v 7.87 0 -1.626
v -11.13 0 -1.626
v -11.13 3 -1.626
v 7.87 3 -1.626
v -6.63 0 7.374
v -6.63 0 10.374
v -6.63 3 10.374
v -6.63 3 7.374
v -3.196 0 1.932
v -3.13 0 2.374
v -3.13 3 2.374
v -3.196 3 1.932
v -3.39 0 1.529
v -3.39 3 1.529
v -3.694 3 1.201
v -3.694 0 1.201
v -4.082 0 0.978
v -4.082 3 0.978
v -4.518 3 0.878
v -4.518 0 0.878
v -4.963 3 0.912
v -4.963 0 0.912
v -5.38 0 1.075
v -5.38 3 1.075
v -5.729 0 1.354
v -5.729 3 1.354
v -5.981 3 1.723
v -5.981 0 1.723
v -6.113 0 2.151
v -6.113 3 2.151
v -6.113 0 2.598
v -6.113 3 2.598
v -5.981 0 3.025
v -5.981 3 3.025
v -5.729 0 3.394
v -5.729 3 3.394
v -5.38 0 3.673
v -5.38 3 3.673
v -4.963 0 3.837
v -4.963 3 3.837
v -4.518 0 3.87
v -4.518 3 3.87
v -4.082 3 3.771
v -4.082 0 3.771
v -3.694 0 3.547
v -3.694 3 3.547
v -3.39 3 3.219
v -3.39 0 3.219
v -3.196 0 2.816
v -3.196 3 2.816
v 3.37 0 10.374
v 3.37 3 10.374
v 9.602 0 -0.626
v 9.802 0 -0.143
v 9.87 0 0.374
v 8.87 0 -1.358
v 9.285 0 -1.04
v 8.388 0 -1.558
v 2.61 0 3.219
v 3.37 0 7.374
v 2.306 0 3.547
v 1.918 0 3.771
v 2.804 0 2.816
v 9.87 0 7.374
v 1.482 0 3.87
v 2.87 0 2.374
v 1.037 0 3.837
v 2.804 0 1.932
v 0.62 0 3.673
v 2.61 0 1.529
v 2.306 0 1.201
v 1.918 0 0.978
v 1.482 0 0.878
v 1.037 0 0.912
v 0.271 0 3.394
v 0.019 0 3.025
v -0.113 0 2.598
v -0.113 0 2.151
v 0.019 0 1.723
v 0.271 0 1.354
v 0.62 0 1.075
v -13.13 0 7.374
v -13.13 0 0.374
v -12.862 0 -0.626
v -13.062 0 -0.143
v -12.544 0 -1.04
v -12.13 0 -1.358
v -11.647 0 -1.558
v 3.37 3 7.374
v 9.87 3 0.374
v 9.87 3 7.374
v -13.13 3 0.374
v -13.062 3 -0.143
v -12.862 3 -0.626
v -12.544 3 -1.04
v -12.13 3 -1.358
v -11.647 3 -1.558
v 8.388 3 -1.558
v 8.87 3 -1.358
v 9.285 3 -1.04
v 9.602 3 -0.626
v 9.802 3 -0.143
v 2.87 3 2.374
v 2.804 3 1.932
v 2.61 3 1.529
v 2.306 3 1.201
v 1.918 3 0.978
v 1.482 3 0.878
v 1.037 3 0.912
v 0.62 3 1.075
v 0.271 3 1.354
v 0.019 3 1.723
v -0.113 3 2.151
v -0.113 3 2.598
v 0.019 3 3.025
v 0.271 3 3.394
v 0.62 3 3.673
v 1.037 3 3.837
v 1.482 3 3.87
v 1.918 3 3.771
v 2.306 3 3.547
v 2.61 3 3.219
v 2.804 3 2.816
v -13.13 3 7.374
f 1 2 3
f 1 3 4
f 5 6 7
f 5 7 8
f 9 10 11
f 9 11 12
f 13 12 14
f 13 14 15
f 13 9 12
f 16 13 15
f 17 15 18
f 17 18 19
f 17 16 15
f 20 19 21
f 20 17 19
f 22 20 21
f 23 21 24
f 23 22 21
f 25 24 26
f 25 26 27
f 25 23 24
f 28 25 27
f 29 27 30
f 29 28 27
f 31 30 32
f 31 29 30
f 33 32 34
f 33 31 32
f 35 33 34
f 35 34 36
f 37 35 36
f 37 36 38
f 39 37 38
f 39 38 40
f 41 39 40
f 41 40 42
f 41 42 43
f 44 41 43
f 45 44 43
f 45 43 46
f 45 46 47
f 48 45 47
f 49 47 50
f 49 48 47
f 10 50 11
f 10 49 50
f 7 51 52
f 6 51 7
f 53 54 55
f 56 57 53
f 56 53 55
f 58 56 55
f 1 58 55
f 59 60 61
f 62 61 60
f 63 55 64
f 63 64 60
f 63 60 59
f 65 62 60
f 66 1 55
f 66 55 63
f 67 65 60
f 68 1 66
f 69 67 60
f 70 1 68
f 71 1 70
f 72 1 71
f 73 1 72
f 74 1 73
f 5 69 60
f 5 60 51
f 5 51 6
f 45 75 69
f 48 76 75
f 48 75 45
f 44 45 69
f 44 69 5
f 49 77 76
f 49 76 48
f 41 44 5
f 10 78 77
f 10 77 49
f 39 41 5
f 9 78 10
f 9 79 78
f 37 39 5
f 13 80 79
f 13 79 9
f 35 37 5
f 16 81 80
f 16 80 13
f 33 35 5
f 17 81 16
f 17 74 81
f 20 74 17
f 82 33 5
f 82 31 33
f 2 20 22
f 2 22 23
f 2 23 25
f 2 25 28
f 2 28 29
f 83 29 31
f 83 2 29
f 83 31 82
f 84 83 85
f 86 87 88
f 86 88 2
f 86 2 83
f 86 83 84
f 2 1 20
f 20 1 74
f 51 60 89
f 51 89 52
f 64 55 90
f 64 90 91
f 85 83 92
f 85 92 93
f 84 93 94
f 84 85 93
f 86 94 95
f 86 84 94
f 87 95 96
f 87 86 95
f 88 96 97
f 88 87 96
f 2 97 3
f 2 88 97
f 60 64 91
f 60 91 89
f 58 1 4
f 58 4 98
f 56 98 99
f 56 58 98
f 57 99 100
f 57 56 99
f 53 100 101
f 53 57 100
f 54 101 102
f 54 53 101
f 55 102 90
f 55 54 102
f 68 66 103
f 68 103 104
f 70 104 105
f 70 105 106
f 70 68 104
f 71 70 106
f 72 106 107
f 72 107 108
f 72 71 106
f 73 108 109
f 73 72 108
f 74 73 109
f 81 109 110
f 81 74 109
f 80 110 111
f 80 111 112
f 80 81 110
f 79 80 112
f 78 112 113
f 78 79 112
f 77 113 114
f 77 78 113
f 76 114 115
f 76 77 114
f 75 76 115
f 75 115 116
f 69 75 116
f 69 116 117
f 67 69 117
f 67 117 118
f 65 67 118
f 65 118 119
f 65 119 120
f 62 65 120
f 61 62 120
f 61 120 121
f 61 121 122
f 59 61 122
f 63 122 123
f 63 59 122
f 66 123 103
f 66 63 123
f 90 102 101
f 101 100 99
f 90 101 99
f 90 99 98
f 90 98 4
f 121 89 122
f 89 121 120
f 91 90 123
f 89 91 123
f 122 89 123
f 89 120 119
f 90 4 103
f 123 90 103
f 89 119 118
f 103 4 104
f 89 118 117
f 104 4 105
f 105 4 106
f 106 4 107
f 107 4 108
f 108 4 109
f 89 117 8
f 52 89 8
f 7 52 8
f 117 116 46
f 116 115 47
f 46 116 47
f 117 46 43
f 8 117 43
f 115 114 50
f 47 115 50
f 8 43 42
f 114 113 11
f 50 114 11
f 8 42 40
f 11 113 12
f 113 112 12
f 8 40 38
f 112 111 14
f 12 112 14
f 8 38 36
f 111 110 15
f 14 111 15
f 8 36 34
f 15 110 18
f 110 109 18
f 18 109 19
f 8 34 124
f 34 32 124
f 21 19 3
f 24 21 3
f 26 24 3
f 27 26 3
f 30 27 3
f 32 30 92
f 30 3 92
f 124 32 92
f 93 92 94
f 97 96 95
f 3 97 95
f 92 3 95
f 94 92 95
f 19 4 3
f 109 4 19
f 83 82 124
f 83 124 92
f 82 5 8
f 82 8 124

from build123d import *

# Parameters (mm, degrees)
SKETCH1_R           = 1.5
BOSS_EXTRUDE1_DEPTH = 3


with BuildPart() as part:
    # Sketch1 → Boss-Extrude1 (new body)
    with BuildSketch(Plane(origin=(0, 0, 0), x_dir=(1, 0, 0), z_dir=(0, 1, 0))):
        with BuildLine():
            Line((-11.129677419, 1.625806452), (7.870322581, 1.625806452))
            ThreePointArc((7.870322581, 1.625806452), (9.284536143, 1.040020014), (9.870322581, -0.374193548))
            Line((9.870322581, -0.374193548), (9.870322581, -7.374193548))
            Line((9.870322581, -7.374193548), (3.370322581, -7.374193548))
            Line((3.370322581, -7.374193548), (3.370322581, -10.374193548))
            Line((3.370322581, -10.374193548), (-6.629677419, -10.374193548))
            Line((-6.629677419, -10.374193548), (-6.629677419, -7.374193548))
            Line((-6.629677419, -7.374193548), (-13.129677419, -7.374193548))
            Line((-13.129677419, -7.374193548), (-13.129677419, -0.374193548))
            ThreePointArc((-13.129677419, -0.374193548), (-12.543890982, 1.040020014), (-11.129677419, 1.625806452))
        make_face()
        with Locations((-4.629677419, -2.374193548)):
            Circle(SKETCH1_R, mode=Mode.SUBTRACT)
        with Locations((1.370322581, -2.374193548)):
            Circle(SKETCH1_R, mode=Mode.SUBTRACT)
    extrude(amount=BOSS_EXTRUDE1_DEPTH)


solid = part.part
